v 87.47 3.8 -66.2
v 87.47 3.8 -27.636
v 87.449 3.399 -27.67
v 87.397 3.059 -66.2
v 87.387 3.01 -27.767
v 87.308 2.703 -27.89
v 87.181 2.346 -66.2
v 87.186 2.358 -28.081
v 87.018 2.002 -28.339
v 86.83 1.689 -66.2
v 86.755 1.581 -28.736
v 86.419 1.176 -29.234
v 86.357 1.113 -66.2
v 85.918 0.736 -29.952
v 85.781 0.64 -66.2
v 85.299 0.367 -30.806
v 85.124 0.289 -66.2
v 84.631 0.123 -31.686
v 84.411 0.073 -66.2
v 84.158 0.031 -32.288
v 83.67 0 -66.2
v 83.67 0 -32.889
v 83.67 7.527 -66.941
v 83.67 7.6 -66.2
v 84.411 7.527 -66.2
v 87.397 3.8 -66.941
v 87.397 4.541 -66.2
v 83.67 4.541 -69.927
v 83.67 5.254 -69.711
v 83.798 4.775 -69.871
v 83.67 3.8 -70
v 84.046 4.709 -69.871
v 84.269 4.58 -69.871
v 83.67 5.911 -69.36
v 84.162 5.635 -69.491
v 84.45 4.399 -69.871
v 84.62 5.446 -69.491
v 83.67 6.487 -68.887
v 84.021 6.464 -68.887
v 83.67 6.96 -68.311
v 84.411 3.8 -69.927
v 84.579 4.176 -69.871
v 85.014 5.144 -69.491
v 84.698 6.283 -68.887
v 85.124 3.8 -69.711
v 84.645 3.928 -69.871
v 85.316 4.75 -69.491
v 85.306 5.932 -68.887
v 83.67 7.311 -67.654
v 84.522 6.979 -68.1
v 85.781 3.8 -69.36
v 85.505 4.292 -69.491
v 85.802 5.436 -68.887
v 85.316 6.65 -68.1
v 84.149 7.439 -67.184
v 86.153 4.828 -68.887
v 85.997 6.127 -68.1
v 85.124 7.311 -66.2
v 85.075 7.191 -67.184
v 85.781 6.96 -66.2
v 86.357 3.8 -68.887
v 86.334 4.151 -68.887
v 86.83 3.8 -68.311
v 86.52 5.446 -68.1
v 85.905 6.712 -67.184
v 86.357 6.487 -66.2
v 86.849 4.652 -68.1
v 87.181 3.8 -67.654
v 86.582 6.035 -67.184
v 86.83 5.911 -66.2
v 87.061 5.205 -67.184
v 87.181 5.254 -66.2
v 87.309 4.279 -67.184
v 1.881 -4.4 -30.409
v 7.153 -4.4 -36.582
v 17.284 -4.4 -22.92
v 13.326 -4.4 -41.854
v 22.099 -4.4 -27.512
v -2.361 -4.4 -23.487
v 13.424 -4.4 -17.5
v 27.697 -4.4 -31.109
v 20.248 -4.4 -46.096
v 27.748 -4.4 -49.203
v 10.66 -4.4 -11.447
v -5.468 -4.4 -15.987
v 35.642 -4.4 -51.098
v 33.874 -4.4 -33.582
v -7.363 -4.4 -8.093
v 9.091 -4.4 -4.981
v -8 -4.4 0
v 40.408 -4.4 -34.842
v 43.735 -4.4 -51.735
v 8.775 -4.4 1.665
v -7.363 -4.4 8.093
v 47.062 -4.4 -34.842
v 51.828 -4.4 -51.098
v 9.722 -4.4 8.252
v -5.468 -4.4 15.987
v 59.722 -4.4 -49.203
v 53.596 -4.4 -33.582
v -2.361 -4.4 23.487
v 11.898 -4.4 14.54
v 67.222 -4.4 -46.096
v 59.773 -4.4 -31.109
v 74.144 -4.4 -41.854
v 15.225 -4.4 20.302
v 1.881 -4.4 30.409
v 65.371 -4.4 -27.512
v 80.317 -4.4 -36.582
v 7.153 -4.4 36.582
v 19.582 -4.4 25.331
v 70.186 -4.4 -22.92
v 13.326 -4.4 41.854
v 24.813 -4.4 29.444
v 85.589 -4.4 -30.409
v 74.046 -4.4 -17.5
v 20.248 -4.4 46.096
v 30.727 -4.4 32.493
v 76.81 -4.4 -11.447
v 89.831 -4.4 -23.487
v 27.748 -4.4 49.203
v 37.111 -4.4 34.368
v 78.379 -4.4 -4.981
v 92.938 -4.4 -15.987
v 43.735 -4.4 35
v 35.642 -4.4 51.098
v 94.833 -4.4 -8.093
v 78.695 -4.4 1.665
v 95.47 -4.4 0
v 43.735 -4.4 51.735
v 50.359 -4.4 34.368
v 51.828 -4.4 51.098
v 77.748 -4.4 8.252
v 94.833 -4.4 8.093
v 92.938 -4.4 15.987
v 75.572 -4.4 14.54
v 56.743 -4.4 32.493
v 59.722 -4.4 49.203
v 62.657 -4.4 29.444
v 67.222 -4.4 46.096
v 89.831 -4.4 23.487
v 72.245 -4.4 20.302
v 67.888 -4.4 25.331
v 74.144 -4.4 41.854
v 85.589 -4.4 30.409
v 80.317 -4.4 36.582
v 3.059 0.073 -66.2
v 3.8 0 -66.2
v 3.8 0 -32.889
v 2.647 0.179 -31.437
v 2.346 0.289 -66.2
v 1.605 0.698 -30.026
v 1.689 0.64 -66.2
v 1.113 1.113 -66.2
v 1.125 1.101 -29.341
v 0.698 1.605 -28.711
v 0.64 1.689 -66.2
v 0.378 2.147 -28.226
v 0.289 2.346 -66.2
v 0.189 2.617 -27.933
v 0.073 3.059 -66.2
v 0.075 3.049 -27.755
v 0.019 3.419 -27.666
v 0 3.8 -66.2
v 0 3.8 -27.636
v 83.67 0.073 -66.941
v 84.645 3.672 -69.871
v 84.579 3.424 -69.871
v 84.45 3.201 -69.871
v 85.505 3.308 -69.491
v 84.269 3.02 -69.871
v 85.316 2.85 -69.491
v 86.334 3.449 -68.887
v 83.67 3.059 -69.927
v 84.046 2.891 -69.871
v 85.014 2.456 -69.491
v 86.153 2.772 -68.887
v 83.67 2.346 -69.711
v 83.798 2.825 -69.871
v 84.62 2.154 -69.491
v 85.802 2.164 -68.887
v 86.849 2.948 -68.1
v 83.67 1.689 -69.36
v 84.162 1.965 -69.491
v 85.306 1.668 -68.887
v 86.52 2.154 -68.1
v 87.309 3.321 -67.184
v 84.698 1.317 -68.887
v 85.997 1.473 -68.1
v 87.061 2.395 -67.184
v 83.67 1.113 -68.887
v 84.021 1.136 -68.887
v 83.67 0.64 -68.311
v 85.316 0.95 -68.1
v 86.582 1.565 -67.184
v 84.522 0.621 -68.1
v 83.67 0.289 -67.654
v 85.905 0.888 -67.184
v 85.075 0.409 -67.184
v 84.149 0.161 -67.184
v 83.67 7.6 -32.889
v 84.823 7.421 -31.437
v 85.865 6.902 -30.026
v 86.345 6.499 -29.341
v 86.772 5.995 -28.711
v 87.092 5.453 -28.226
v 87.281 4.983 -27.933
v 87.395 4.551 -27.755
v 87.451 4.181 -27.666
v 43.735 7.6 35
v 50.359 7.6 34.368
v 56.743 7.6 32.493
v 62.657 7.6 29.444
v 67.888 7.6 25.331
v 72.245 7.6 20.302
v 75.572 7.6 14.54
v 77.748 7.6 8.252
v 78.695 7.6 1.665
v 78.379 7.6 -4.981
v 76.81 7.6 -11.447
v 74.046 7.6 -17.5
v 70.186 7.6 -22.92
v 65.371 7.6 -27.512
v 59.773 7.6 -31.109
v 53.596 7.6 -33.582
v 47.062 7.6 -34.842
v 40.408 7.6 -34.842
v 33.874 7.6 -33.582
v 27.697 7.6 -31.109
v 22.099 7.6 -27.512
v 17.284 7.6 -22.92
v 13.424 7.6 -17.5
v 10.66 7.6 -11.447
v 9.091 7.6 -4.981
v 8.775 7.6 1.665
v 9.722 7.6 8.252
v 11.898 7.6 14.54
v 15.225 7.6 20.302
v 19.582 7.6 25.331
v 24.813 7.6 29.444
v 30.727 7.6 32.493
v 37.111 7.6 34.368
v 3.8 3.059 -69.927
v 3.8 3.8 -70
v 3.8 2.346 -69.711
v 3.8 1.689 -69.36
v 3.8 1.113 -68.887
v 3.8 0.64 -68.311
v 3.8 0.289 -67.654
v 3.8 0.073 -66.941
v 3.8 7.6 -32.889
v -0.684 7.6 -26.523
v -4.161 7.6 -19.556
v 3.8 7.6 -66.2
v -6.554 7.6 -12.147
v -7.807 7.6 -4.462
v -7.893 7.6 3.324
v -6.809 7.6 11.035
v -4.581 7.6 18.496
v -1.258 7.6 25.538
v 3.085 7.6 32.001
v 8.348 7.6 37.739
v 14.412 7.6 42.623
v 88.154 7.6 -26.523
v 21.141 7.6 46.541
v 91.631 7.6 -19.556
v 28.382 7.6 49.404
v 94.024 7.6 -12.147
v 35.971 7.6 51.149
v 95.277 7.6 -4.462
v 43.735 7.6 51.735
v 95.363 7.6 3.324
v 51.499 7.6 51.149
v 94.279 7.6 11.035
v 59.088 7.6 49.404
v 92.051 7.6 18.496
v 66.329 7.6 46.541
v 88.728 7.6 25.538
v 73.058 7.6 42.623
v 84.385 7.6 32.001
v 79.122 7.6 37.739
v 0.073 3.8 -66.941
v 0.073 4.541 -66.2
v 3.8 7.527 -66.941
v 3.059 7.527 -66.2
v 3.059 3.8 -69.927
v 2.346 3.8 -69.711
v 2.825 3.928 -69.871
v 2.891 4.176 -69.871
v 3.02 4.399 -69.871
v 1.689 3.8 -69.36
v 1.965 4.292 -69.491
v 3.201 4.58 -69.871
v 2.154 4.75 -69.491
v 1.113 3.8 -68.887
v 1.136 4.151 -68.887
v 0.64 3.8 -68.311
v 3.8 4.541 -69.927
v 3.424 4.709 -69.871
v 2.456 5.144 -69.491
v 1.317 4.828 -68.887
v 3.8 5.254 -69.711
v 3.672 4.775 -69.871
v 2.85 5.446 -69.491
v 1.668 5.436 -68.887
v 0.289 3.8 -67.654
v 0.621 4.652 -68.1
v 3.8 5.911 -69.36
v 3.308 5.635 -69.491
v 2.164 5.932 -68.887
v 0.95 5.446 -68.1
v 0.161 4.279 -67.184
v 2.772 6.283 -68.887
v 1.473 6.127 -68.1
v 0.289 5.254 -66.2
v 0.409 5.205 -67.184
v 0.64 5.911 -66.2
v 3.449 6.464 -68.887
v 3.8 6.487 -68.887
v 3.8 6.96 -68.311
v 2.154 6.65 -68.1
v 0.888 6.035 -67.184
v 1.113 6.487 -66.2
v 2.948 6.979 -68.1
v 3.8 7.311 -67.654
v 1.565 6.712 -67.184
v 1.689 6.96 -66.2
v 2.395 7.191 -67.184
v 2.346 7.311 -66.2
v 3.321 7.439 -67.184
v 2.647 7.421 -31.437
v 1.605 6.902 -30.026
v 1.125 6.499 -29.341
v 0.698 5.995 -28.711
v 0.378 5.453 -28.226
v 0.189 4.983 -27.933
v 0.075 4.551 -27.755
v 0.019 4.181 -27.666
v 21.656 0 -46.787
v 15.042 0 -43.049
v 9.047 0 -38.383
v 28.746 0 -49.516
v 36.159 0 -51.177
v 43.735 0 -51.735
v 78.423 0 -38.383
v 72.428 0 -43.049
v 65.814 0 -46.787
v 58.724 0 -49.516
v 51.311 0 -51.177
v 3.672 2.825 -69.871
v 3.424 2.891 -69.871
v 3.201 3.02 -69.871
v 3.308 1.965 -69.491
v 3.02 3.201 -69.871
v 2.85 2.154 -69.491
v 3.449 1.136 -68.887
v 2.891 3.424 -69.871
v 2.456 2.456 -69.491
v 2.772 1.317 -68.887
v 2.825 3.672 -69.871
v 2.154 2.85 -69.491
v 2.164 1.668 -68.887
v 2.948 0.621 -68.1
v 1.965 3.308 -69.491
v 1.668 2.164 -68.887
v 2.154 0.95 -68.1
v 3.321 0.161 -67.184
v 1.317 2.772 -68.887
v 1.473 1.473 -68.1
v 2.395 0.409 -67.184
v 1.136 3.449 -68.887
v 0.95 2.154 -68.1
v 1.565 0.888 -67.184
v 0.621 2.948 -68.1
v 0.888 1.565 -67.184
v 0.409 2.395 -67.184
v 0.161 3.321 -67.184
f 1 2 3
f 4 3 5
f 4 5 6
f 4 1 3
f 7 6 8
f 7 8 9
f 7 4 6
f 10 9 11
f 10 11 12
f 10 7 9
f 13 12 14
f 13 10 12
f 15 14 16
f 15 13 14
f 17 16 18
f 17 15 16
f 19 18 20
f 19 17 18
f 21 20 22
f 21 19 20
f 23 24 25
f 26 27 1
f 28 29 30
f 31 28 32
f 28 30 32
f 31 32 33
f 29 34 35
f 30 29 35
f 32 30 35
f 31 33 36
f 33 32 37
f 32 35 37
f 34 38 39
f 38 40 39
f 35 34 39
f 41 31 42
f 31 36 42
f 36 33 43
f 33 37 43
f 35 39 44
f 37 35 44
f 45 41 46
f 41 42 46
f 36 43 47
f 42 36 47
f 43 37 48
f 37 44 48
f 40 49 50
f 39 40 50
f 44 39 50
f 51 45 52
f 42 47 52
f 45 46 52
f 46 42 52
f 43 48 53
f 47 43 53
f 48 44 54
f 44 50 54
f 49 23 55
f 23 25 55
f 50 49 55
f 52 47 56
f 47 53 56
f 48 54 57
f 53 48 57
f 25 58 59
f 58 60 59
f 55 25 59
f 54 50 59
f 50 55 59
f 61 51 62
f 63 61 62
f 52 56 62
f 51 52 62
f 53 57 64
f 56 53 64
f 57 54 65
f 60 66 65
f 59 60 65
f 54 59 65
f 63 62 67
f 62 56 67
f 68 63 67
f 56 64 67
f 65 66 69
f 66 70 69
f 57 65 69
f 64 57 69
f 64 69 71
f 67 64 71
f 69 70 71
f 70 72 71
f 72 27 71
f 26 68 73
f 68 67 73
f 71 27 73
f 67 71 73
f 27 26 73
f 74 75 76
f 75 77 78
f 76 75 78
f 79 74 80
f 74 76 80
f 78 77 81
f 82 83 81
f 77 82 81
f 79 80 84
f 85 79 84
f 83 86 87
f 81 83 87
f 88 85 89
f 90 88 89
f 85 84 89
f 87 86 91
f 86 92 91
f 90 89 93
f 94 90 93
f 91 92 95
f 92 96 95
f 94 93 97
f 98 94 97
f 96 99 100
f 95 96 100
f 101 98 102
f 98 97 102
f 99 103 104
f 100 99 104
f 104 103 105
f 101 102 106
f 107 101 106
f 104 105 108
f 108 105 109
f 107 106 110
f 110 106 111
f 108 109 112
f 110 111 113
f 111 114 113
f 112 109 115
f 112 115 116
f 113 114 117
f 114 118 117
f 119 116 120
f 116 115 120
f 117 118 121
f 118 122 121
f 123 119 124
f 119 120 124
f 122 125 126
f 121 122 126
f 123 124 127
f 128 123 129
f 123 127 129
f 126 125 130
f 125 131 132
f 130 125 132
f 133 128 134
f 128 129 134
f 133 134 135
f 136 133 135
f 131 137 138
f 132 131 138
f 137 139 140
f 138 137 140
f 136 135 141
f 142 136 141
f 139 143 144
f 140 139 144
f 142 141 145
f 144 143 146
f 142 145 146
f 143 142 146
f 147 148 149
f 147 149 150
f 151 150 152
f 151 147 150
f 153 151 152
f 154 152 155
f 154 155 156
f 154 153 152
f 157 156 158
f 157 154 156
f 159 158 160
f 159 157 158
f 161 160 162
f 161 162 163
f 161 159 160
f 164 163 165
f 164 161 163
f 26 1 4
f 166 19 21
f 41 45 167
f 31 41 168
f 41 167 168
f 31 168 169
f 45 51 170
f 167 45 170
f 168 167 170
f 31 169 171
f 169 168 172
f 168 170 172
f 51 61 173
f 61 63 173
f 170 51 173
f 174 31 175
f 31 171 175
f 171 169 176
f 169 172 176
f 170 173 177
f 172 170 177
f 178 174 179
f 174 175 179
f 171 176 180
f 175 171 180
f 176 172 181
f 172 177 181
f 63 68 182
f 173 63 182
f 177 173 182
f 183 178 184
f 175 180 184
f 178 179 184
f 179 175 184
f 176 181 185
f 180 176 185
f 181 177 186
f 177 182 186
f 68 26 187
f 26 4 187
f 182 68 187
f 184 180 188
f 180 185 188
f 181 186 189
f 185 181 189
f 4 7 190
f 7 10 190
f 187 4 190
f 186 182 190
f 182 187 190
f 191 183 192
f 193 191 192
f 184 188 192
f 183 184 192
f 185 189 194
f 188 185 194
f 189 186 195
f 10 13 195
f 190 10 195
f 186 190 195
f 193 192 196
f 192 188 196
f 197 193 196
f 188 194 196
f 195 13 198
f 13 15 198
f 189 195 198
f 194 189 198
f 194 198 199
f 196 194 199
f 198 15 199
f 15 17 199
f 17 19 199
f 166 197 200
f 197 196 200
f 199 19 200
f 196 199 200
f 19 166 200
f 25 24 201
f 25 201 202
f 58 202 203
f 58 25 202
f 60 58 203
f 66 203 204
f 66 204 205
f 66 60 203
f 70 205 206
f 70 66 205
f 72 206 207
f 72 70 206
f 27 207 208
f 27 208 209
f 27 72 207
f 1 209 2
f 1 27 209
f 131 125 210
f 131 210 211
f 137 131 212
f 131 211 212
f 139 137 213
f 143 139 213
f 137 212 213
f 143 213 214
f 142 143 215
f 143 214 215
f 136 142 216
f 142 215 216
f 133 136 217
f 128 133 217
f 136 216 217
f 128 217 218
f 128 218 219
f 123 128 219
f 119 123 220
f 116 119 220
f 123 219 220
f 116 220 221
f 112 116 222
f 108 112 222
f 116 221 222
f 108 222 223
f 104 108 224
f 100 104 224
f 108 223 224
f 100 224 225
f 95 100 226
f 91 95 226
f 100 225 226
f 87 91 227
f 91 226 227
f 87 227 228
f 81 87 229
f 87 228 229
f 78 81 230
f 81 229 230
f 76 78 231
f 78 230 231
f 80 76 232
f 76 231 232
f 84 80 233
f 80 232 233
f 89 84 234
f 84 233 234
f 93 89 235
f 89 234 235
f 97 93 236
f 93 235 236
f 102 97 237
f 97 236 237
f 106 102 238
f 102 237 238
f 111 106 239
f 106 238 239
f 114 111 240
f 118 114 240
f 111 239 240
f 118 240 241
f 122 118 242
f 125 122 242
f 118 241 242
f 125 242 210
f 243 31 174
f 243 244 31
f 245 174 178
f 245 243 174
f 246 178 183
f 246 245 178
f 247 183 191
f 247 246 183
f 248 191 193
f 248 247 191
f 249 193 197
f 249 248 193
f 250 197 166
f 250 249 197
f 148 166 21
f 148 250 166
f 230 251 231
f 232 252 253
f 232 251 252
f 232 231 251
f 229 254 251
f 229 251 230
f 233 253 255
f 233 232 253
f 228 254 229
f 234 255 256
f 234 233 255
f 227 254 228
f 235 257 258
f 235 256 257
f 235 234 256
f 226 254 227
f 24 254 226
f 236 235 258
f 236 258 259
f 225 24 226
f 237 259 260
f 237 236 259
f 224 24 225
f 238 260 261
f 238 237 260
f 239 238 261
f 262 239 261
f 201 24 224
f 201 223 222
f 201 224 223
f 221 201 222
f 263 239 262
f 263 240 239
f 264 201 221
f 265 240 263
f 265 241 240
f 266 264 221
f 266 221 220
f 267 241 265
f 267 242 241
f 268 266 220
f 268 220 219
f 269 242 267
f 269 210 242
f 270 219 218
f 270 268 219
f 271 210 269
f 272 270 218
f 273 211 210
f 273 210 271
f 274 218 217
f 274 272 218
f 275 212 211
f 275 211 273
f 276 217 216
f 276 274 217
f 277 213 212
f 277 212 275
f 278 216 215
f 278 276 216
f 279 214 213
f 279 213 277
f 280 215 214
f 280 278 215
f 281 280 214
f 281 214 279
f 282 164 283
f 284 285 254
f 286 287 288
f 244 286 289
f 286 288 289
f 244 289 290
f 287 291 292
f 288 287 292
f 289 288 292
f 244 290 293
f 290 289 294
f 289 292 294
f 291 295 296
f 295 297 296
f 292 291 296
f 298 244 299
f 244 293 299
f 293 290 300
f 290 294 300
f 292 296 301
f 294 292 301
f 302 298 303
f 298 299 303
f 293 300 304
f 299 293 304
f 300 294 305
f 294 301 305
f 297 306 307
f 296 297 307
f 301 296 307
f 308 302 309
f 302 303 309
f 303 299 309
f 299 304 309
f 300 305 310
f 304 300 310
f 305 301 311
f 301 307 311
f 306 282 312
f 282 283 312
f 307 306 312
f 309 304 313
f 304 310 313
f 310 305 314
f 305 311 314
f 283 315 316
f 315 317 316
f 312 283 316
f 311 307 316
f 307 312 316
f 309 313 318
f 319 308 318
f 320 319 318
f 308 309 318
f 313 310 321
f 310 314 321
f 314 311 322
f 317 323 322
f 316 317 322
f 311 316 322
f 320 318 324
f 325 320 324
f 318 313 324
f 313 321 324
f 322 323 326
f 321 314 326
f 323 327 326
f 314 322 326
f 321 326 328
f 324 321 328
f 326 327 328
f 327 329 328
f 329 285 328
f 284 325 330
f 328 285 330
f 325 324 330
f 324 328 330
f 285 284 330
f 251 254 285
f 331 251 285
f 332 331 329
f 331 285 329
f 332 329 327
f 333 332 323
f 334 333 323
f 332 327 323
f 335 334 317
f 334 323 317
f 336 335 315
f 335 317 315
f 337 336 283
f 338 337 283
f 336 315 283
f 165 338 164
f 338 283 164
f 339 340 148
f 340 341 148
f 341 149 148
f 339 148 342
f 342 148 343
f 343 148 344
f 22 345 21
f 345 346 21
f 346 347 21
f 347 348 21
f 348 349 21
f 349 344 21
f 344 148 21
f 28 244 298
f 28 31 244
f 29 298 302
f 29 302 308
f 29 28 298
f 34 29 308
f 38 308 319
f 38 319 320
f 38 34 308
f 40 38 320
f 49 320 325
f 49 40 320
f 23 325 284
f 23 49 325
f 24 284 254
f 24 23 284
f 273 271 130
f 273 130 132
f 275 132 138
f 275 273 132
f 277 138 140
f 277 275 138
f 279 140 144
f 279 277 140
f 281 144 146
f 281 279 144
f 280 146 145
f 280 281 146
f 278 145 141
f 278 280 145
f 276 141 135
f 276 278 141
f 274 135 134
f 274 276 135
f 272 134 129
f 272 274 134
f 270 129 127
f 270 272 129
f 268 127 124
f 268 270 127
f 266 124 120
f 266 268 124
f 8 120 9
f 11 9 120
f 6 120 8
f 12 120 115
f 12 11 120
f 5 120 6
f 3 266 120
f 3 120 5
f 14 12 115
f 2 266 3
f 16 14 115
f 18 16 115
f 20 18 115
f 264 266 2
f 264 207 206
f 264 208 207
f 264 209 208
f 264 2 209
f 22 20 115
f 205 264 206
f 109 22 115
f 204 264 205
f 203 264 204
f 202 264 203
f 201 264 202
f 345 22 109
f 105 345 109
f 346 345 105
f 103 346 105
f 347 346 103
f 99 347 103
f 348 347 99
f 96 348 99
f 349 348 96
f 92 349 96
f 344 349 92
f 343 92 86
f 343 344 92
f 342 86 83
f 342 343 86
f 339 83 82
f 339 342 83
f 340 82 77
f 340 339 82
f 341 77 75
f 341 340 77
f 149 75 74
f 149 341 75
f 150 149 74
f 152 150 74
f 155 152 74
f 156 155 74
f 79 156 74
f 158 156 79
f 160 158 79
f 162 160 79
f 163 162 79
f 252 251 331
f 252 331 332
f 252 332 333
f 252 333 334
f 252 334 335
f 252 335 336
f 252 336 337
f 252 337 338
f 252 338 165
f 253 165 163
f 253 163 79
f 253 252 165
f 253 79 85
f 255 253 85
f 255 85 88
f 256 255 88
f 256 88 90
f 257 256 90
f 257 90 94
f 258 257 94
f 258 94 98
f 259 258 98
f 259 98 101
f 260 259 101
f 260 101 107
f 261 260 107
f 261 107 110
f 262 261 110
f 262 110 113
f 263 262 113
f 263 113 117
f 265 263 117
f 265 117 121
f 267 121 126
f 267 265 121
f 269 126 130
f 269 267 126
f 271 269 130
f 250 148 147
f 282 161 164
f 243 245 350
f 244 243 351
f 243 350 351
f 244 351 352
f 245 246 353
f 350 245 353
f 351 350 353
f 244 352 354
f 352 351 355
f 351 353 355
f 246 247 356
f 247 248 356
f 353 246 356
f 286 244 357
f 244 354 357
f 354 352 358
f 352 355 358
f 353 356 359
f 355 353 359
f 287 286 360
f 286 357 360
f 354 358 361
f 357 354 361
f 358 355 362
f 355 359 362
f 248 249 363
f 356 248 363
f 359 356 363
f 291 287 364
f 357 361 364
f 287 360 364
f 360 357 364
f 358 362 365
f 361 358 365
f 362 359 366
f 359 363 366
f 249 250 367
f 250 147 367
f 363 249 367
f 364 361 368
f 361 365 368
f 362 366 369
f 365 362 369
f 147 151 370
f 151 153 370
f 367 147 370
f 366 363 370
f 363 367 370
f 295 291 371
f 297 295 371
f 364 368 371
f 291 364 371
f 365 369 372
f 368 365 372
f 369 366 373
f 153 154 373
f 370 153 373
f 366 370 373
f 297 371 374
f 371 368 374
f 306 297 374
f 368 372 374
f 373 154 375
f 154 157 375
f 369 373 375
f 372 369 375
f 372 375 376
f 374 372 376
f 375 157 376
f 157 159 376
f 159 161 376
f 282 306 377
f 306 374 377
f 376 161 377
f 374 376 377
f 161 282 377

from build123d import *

# Parameters (mm, degrees)
SKETCH1_W           = 87.47
SKETCH1_H           = 70
BOSS_EXTRUDE1_DEPTH = 7.6
SKETCH2_R           = 43.735
BOSS_EXTRUDE2_DEPTH = 12
SKETCH3_R           = 51.735
BOSS_EXTRUDE3_DEPTH = 12
SKETCH4_R           = 35
CUT_EXTRUDE1_DEPTH  = 12
FILLET1_R           = 3.8
FILLET2_R           = 3.8


with BuildPart() as part:
    # Sketch1 → Boss-Extrude1 (new body)
    with BuildSketch(Plane(origin=(0, 0, 0), x_dir=(1, 0, 0), z_dir=(0, 1, 0))):
        with Locations((43.735, 35)):
            Rectangle(SKETCH1_W, SKETCH1_H)
    extrude(amount=BOSS_EXTRUDE1_DEPTH)

    # Sketch2 → Boss-Extrude2 (add)
    with BuildSketch(Plane(origin=(0, 7.6, 0), x_dir=(1, 0, 0), z_dir=(0, 1, 0))):
        with Locations(Location((43.735, 0, 0), (0, 0, 270))):
            Circle(SKETCH2_R)
    extrude(amount=-BOSS_EXTRUDE2_DEPTH)

    # Sketch3 → Boss-Extrude3 (add)
    with BuildSketch(Plane(origin=(0, 7.6, 0), x_dir=(1, 0, 0), z_dir=(0, 1, 0))):
        with Locations(Location((43.735, 0, 0), (0, 0, 270))):
            Circle(SKETCH3_R)
    extrude(amount=-BOSS_EXTRUDE3_DEPTH)

    # Sketch4 → Cut-Extrude1 (cut)
    with BuildSketch(Plane(origin=(0, 7.6, 0), x_dir=(1, 0, 0), z_dir=(0, 1, 0))):
        with Locations(Location((43.735, 0, 0), (0, 0, 270))):
            Circle(SKETCH4_R)
    extrude(amount=-CUT_EXTRUDE1_DEPTH, mode=Mode.SUBTRACT)

    # Fillet1
    fillet1_edges = [part.edges().sort_by_distance(p)[0] for p in [
        (87.47, 0, -48.818104067),
        (87.47, 7.6, -48.818104067),
        (0, 7.6, -48.818104067),
        (0, 0, -48.818104067),
    ]]
    fillet(fillet1_edges, radius=FILLET1_R - 0.0001)  # a hair under: the kernel refuses the full size

    # Fillet2
    fillet2_edges = [part.edges().sort_by_distance(p)[0] for p in [
        (43.735, 7.6, -70),
        (43.735, 0, -70),
        (86.357035058, 6.487035058, -70),
        (86.357035058, 1.112964942, -70),
        (1.112964942, 1.112964942, -70),
        (1.112964942, 6.487035058, -70),
    ]]
    fillet(fillet2_edges, radius=FILLET2_R - 0.0001)  # a hair under: the kernel refuses the full size


solid = part.part
